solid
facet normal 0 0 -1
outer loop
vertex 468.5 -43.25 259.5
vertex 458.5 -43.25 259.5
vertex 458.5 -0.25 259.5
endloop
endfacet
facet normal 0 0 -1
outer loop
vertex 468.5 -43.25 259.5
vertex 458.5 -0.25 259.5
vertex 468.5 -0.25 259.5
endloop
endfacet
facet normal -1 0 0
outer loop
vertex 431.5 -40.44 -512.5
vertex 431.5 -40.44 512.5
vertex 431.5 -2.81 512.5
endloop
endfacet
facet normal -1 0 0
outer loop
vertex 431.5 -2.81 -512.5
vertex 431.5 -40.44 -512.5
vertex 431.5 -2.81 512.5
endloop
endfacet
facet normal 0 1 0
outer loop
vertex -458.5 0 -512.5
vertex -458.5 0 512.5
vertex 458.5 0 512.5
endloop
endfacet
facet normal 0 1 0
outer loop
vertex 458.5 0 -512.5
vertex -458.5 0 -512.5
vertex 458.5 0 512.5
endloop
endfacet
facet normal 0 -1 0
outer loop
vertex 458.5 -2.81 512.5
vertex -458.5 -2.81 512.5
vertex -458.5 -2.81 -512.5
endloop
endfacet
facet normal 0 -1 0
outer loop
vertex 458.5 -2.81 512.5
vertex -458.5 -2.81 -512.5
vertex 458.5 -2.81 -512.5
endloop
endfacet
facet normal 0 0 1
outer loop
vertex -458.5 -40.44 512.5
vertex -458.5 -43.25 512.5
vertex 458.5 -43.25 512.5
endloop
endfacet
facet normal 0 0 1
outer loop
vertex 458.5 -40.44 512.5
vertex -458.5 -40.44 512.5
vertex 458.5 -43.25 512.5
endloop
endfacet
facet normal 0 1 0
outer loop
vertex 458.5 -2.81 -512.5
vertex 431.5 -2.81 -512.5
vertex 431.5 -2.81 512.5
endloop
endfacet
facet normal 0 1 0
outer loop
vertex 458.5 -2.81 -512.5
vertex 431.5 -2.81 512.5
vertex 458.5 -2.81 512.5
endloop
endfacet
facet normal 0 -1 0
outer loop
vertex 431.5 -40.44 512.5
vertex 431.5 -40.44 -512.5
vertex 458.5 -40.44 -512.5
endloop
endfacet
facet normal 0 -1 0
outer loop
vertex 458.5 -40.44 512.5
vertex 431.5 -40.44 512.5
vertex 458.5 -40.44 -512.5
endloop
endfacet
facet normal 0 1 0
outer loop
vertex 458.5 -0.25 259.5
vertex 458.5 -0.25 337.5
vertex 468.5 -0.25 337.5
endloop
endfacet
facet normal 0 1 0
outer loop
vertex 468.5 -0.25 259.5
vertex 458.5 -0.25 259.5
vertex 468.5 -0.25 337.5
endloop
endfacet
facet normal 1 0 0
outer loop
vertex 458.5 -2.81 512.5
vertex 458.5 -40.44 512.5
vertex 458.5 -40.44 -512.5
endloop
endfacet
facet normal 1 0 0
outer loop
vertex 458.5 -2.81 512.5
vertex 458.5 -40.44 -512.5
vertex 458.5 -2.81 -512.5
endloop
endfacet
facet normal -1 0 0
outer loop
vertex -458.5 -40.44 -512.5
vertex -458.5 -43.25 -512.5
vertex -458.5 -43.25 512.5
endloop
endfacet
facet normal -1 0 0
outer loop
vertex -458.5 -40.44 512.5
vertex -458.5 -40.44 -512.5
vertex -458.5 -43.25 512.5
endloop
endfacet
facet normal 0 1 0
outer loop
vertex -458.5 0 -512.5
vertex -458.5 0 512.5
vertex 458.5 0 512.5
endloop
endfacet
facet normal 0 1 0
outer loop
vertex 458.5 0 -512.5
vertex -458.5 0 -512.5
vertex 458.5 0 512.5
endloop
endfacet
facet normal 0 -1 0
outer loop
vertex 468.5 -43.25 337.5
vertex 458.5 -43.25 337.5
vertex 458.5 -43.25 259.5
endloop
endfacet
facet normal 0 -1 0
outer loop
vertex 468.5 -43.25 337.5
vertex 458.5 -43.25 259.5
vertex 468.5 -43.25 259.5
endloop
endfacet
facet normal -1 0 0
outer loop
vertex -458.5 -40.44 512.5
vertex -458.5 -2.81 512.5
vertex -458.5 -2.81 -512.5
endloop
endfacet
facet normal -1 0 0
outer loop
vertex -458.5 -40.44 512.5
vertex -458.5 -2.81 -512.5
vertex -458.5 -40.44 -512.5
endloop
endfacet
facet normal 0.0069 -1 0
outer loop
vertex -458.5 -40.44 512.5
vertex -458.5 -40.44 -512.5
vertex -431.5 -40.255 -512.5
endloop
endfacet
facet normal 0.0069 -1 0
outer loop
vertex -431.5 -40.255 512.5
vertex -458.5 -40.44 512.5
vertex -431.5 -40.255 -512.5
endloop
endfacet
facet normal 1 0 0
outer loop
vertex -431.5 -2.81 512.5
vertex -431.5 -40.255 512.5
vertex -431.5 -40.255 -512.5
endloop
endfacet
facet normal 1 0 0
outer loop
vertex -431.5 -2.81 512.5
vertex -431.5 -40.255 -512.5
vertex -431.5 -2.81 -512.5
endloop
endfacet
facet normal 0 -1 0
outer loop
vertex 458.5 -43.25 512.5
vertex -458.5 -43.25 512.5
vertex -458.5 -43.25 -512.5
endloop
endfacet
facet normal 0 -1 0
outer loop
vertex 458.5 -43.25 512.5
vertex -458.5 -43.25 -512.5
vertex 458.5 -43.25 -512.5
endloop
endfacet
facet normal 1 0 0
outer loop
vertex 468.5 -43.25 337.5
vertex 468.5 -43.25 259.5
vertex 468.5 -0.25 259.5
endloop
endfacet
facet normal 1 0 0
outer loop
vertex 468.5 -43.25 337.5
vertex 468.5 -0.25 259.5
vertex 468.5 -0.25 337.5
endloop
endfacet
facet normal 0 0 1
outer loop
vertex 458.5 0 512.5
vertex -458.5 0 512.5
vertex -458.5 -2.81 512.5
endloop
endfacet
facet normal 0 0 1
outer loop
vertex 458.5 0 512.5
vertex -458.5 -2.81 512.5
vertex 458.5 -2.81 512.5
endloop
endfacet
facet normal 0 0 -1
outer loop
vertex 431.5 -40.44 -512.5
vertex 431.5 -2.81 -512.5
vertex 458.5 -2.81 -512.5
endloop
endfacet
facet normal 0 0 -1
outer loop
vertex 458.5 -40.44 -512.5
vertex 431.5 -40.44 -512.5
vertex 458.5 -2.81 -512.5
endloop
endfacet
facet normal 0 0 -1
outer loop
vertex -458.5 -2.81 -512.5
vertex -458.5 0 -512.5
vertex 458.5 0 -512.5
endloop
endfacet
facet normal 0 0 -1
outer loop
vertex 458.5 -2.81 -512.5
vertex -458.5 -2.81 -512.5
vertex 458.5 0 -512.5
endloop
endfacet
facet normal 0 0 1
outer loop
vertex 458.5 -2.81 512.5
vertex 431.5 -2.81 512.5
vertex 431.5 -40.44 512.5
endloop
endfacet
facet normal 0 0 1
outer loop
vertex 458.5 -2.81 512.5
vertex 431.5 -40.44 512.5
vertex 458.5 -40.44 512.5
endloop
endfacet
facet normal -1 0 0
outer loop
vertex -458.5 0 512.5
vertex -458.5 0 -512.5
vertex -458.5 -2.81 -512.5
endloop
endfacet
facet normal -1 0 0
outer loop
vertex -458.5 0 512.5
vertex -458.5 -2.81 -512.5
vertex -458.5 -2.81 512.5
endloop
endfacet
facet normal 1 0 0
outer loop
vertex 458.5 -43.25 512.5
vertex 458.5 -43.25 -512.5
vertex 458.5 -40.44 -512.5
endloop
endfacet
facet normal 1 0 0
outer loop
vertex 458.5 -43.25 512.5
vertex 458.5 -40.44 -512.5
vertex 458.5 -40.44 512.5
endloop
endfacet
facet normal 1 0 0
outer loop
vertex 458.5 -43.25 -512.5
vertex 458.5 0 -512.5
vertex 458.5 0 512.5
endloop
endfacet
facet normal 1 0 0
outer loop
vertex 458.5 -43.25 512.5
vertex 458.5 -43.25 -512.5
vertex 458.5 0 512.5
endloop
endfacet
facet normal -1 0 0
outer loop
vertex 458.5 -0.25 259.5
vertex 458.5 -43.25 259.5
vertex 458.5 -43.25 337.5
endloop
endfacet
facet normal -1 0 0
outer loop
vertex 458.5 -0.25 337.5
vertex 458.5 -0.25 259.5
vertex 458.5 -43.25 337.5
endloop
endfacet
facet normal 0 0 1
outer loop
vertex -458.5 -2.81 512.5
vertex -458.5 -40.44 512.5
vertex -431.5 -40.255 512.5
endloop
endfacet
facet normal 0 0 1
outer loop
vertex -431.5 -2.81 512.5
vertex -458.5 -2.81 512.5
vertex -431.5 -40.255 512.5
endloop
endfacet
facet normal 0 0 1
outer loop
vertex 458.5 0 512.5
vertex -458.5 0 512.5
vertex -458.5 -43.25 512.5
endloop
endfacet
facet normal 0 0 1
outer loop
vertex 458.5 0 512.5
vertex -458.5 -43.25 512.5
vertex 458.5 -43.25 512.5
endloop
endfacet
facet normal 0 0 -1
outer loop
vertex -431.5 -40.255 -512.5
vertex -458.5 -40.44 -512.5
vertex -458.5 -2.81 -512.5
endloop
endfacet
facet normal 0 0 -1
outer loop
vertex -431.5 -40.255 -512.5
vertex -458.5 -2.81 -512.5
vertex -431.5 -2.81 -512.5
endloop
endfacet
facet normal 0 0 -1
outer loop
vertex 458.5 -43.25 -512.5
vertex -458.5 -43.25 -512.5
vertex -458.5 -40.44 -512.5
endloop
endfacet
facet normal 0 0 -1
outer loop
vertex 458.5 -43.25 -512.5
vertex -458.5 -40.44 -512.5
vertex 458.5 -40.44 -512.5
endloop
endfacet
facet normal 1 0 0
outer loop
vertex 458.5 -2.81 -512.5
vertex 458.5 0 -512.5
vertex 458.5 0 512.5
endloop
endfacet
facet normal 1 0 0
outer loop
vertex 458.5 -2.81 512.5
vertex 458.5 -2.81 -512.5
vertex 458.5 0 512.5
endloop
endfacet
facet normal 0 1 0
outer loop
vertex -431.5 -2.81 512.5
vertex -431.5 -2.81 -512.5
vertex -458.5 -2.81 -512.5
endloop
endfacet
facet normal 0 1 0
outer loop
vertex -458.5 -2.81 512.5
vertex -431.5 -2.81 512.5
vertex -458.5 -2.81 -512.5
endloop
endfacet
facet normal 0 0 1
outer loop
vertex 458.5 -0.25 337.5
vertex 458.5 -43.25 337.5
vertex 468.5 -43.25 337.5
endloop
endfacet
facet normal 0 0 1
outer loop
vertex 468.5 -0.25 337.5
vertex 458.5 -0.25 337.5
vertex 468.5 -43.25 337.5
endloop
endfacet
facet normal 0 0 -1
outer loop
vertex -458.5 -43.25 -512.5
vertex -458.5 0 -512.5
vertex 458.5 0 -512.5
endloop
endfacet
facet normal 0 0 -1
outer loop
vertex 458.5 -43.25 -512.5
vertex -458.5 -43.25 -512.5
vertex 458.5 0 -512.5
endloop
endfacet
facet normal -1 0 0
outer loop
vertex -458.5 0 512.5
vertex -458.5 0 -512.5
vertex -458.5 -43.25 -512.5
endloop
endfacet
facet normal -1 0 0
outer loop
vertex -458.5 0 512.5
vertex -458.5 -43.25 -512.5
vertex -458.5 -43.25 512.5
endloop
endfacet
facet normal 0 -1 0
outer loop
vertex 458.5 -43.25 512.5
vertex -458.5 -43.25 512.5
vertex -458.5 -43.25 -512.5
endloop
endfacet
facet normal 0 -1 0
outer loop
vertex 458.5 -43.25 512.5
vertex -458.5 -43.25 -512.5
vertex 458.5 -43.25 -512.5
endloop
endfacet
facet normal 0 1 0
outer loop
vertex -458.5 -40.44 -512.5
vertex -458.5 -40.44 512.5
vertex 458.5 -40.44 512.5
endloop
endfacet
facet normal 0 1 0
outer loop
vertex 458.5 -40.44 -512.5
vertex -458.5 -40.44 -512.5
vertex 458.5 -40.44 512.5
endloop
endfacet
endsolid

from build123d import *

# Parameters (mm, degrees)
F0_W     = 917
F0_H     = 1025
F1_DEPTH = 43.25
F2_DEPTH = 2.81
F3_DEPTH = 2.81
F4_W     = 10
F4_H     = 78
F5_DEPTH = 43
F7_DEPTH = 1025
F6_W     = 27
F6_H     = 37.63


with BuildPart() as f1:
    # F0 (on Front) → F1 (new body)
    with BuildSketch(Plane.XZ):
        Rectangle(F0_W, F0_H)
    extrude(amount=F1_DEPTH)


with BuildPart() as f2:
    # F2 (new): a face of the model
    f2_faces = [f1.part.faces().sort_by_distance(p)[0] for p in [
        (0, -43.25, 0),
    ]]
    extrude(f2_faces, amount=-F2_DEPTH)


with BuildPart() as f3:
    # F3 (new): a face of the model
    f3_faces = [f1.part.faces().sort_by_distance(p)[0] for p in [
        (0, 0, 0),
    ]]
    extrude(f3_faces, amount=-F3_DEPTH)


with BuildPart() as f5:
    # F4 (on face) → F5 (new body)
    with BuildSketch(Plane.XZ.offset(43.25)):
        with Locations((463.5, 298.5)):
            Rectangle(F4_W, F4_H)
    extrude(amount=-F5_DEPTH)


with BuildPart() as f7:
    # F6 (on face) → F7 (new body, through all)
    with BuildSketch(Plane.XY.offset(512.5)):
        Polygon((-458.5, -2.81), (-458.5, -40.44), (-431.5, -40.2551144361), (-431.5, -2.81), align=None)
    extrude(amount=-F7_DEPTH)


with BuildPart() as f7b:
    # F6 (on face) → F7, piece 2 (new body, through all)
    with BuildSketch(Plane.XY.offset(512.5)):
        with Locations((445, -21.625)):
            Rectangle(F6_W, F6_H)
    extrude(amount=-F7_DEPTH)


solid = Compound([f1.part, f2.part, f3.part, f5.part, f7.part, f7b.part])
